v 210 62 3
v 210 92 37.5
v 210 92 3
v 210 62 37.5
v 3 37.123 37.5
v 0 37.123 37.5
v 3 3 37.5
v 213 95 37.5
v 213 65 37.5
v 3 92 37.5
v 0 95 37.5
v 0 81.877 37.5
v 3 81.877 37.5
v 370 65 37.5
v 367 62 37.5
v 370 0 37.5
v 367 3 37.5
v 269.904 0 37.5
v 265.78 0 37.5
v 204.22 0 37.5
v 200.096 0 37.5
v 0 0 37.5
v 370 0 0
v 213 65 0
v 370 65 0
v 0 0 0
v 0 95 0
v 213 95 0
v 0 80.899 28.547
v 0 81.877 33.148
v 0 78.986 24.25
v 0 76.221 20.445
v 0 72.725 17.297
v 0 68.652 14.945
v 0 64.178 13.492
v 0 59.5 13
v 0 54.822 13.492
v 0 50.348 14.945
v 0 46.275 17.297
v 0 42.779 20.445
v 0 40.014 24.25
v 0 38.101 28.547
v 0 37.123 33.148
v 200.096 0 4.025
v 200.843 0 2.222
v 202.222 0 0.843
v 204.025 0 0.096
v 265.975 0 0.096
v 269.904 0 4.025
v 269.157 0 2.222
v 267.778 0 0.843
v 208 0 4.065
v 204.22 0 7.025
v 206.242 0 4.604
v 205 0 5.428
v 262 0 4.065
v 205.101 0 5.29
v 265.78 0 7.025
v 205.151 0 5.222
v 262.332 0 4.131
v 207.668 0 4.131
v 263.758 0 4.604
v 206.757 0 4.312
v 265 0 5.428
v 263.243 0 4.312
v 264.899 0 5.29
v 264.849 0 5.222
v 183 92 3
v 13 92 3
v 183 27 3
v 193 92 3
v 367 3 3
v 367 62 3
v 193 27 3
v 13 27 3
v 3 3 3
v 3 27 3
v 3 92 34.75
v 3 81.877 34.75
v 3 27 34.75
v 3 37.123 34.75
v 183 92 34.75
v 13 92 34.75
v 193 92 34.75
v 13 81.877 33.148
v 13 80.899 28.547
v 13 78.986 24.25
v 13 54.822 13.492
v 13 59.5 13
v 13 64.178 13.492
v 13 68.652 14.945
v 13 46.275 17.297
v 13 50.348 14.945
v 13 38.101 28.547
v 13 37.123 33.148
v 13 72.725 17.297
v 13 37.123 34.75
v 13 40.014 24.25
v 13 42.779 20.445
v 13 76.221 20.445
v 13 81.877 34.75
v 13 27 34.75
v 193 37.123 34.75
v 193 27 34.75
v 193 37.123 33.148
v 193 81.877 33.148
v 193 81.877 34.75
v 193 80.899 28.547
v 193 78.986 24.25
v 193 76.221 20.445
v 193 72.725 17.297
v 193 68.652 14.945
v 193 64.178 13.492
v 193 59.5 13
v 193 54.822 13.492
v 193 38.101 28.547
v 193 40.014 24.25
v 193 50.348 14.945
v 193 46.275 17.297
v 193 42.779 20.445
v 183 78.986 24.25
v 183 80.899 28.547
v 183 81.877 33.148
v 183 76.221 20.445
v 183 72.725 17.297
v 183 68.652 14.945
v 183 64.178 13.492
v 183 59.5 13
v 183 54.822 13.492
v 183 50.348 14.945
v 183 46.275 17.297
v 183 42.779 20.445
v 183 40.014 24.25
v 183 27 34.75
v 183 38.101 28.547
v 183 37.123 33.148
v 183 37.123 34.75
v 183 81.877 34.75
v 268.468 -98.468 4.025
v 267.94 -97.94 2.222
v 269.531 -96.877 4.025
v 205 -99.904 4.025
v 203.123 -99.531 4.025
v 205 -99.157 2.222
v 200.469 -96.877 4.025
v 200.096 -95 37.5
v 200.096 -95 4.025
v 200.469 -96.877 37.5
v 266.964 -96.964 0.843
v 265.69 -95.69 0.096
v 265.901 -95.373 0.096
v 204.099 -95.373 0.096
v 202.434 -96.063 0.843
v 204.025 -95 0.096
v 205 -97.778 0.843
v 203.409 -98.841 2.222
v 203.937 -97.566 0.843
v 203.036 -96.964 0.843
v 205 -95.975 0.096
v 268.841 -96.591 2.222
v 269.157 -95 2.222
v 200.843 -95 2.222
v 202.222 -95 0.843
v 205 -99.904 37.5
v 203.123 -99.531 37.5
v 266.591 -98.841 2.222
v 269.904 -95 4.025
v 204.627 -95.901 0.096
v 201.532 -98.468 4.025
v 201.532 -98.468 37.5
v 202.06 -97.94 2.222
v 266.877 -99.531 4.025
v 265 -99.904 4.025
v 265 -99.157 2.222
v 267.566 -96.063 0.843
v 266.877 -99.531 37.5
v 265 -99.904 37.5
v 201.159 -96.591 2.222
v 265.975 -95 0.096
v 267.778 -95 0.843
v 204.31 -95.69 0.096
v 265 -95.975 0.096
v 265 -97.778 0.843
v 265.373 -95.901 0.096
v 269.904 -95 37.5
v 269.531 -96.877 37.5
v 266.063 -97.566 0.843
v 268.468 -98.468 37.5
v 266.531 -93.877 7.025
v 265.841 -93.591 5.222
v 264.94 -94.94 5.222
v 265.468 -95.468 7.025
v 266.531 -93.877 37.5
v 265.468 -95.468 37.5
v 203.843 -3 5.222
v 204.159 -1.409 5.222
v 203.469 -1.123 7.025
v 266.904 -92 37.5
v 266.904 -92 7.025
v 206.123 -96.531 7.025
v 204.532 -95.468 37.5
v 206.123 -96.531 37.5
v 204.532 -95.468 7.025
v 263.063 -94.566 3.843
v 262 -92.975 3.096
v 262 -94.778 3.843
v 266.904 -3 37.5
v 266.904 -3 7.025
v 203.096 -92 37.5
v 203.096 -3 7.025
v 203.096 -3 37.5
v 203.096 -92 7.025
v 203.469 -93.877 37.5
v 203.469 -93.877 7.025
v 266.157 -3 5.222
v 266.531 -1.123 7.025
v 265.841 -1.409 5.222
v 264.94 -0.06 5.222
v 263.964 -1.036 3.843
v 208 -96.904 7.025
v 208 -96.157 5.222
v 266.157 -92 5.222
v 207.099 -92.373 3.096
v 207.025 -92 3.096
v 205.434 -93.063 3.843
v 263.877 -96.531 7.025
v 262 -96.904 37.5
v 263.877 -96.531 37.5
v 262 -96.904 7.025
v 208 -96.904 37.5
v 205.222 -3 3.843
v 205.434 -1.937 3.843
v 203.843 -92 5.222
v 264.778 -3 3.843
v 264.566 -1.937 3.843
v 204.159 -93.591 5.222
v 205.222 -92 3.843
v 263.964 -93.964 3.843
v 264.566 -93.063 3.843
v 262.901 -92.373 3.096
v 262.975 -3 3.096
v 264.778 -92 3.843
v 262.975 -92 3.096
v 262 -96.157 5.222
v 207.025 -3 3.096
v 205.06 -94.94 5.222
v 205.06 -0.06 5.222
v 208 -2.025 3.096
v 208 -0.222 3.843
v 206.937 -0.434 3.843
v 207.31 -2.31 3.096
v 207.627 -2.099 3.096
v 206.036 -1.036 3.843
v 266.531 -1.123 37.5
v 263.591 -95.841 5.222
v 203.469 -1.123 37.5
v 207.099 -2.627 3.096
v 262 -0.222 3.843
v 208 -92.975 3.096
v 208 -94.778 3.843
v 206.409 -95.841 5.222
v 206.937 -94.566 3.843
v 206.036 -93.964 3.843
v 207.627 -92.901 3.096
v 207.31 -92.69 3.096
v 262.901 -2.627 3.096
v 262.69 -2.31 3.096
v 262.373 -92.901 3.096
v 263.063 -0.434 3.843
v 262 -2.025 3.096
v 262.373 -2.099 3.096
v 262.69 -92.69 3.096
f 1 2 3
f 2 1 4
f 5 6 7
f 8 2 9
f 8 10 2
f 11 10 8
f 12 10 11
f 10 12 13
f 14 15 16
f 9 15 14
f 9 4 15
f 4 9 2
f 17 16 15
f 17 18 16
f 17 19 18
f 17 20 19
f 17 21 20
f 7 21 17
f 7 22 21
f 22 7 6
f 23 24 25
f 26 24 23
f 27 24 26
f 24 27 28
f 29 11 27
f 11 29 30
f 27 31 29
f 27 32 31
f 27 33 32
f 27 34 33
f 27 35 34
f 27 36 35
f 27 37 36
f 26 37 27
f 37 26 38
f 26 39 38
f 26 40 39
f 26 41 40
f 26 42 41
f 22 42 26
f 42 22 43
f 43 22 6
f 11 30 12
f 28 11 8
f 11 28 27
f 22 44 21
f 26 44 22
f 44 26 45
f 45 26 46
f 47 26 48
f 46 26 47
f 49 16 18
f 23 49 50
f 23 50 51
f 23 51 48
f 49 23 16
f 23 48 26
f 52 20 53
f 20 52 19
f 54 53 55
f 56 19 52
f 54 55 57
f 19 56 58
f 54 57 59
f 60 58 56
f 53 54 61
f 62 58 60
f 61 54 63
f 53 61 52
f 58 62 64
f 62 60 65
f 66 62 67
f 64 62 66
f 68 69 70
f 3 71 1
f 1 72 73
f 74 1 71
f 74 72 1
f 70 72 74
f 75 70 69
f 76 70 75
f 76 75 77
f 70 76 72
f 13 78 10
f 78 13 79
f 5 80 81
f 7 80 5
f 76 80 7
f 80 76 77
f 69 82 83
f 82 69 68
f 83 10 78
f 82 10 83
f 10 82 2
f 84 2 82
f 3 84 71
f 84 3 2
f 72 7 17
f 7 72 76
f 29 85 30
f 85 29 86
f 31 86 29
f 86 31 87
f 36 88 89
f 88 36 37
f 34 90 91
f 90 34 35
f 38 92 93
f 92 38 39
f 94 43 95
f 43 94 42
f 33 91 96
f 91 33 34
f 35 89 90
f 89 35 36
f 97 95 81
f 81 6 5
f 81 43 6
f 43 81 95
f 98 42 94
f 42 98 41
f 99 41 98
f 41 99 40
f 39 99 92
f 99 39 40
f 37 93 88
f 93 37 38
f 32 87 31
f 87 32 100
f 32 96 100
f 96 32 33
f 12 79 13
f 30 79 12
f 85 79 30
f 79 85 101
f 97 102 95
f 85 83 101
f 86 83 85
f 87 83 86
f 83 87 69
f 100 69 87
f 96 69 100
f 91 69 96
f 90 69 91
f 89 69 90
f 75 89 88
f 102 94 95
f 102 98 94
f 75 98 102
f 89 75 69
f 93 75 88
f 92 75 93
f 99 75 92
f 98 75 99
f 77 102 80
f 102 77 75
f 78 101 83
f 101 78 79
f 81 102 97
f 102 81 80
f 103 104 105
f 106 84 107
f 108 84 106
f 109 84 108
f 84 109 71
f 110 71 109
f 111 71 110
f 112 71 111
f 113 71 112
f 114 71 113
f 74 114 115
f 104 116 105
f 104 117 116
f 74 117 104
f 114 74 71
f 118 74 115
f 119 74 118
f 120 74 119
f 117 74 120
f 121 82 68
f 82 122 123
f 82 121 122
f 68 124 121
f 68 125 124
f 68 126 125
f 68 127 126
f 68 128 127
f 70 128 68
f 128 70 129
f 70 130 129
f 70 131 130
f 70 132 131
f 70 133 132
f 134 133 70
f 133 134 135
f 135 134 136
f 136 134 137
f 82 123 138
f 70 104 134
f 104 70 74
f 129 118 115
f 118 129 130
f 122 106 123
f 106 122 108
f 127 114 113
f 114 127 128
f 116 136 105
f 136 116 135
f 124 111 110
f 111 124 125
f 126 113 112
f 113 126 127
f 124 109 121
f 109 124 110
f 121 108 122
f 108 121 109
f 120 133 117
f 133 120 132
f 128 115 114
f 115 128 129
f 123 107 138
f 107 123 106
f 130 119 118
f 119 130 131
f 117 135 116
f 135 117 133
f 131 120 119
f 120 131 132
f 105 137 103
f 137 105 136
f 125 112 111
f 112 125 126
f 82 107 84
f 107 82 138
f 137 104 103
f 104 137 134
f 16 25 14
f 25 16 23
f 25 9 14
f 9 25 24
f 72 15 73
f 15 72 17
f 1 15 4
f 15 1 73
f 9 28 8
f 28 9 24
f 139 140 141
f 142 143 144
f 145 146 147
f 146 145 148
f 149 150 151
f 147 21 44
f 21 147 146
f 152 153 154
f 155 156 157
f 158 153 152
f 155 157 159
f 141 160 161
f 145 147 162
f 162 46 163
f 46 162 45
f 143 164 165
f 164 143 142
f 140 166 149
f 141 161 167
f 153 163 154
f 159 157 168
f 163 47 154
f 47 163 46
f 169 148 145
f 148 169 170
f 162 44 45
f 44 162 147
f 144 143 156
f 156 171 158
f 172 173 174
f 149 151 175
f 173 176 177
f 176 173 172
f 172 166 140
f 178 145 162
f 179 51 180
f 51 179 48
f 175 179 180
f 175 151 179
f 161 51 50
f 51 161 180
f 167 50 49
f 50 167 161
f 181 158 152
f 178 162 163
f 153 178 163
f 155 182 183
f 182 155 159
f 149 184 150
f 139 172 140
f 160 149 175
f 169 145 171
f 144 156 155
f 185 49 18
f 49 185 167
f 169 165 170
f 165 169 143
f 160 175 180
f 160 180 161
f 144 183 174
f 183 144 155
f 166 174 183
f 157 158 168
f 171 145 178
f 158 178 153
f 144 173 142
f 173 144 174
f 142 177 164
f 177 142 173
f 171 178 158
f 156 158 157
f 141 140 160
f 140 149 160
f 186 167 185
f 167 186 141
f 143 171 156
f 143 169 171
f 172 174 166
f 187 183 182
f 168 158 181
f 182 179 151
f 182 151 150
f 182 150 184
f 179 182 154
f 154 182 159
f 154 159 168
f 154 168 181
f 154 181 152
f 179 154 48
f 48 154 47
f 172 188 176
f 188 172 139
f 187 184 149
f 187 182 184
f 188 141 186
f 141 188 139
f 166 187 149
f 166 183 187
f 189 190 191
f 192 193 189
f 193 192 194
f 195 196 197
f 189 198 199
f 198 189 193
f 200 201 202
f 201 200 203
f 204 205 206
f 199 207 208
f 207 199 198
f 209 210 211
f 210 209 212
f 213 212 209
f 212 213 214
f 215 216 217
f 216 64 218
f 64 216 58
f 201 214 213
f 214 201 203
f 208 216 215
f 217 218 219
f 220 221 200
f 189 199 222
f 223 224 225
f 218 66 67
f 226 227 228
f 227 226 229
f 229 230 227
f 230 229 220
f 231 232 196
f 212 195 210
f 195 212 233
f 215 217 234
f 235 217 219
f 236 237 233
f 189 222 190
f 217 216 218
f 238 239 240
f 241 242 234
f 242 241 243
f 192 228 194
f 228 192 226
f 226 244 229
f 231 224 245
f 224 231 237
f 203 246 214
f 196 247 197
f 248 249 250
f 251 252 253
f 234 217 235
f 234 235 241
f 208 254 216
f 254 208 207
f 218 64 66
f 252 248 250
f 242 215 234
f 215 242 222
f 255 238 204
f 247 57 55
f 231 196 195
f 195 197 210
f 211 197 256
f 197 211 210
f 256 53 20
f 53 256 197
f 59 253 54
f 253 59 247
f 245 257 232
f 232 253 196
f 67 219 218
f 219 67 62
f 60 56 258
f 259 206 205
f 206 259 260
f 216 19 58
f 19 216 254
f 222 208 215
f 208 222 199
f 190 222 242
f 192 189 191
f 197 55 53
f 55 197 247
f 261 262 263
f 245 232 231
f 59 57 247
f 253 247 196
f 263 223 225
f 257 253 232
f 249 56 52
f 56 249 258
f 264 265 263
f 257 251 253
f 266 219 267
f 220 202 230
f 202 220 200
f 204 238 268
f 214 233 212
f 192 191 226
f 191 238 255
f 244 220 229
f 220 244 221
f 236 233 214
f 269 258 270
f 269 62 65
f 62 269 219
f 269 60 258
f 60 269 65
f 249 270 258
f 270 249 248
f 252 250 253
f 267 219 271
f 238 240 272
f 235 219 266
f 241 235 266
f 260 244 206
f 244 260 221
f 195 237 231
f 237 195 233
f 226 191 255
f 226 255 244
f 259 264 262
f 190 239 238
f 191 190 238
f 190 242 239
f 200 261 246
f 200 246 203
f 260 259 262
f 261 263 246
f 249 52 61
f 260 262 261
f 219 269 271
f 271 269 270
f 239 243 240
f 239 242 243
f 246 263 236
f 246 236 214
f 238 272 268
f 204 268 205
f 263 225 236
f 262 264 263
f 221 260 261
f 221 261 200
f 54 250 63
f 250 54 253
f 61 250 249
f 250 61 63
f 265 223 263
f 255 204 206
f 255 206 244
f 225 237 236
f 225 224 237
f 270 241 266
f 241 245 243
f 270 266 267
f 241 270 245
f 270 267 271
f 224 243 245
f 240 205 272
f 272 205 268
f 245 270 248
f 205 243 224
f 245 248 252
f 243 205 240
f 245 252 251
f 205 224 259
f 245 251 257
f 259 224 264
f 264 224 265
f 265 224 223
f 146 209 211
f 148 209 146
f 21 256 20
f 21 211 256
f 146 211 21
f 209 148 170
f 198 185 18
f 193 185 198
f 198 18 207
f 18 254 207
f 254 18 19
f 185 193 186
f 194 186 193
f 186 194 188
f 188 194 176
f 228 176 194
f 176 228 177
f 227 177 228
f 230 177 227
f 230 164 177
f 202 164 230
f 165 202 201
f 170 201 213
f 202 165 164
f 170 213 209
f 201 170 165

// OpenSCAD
/**
* Tagger which can be printed.
* All dimensions are in millimeters
*/




// lens tube dims
lensTubeDiameter=45;
lensTubeLength=200;

// lens tube fixiations dims 
lensTubeFixWidth=10;
lensTubeFixFlesh=10;
lensTubeFixHeight=lensTubeDiameter + 2 * lensTubeFixFlesh;
lensTubeGap=1.5;

// pcb parameters
esp32Height=30;
displayWidth=10;
displayHeight=30;
displayThickness=10;




// gun parameters
gunWallThickness=3;
gunHeight=lensTubeFixHeight + esp32Height;
gunFrontLength = lensTubeLength + 10;
gunBackLength = 150 + displayThickness;
gunThickness = lensTubeDiameter + 30;
gunHalfThickness = gunThickness / 2;

// grip parameters
gripWidth=70;
gripHeight=100;
gripFrontOffset=200;
gripCornerRadius=5;


/**
* Fixiation for the lens tube
*/
module lensTubeFixiation() {
  difference() {
    cube(size=[lensTubeFixWidth, lensTubeFixHeight, lensTubeFixHeight], center=false);     
    translate([0, lensTubeFixHeight / 2, lensTubeFixHeight / 2]) {
      rotate([0, 90, 0]) {
        cylinder(d=lensTubeDiameter, h=lensTubeFixWidth, center=false);    
      }  
    }

    // cut of the top
    offset = lensTubeFixHeight / 2 - lensTubeGap / 2;
    translate([0, 0, offset]) {
      cube(size=[lensTubeFixWidth, lensTubeFixHeight, lensTubeFixHeight / 2 + lensTubeGap / 2], center=false);
    }
  }
}

module gunBodyFront() {
  difference() {    
    cube(size=[gunFrontLength, gunHeight, gunHalfThickness], center=false);
    translate([gunWallThickness, gunWallThickness, gunWallThickness]) {
      cube(size=[gunFrontLength -  gunWallThickness, gunHeight - gunWallThickness * 2,gunHalfThickness - gunWallThickness ], center=false);
    }
  }
}

module gunBodyBack() {
  gunBackHeight =  gunHeight - displayHeight;
  union() {
    difference() {
      cube(size=[gunBackLength, gunBackHeight, gunHalfThickness], center=false);
      translate([0, gunWallThickness, gunWallThickness]) {
        cube(size=[gunBackLength - gunWallThickness, gunBackHeight - gunWallThickness * 2, gunHalfThickness - gunWallThickness], center=false);      
      }
    }
    
    // display part  
    translate([0, gunBackHeight, 0]) {
        cube(size=[gunWallThickness, displayHeight, gunHalfThickness], center=false);     
    }
    
  
  }
}

module gripBody() {
  translate([gripCornerRadius, gripCornerRadius, gripCornerRadius]) {  
    difference() {
      minkowski() {
        cube(size=[gripWidth - 2 * gripCornerRadius , gripHeight - gripCornerRadius, gunHalfThickness -  gripCornerRadius], center=false);
        sphere(r=gripCornerRadius);
      }

      translate([gunWallThickness, gunWallThickness, gunWallThickness]) {
        minkowski() {
          cube(size=[gripWidth - 2 * gripCornerRadius - 2 * gunWallThickness , gripHeight - gripCornerRadius - 2 * gunWallThickness , gunHalfThickness -  gripCornerRadius], center=false);
          sphere(r=gripCornerRadius);
        }
      }


      // cut off the top
      translate([-gripCornerRadius, - gripCornerRadius, gunHalfThickness - gripCornerRadius]) {
        cube(size=[gripWidth, gripHeight + gripCornerRadius, gripCornerRadius], center=false);
      }

      // cut of the cap
      translate([-gripCornerRadius, gripHeight - gripCornerRadius, -gripCornerRadius]) {
        cube(size=[gripWidth,  gripCornerRadius, gunHalfThickness], center=false);
      }     
    }
  }
}

module gunBody() {
  union() {
    difference() {
      gunBodyFront();
      tubeHoleOffset = gunHeight - lensTubeDiameter / 2 - lensTubeFixFlesh -gunWallThickness;
      //echo(str("Variable = ", gunHeight - lensTubeDiameter / 2 - lensTubeFixFlesh -gunWallThickness));
      translate([0,tubeHoleOffset, lensTubeDiameter / 2 + lensTubeFixFlesh + gunWallThickness]) {
        rotate([0, 90, 0]) {
          #cylinder(d=lensTubeDiameter, h=gunWallThickness, center=false);
        }  
      }
      
    }

    translate([gunWallThickness, gunHeight - lensTubeFixHeight - gunWallThickness, gunWallThickness ]) {
      lensTubeFixiation();  
      translate([lensTubeLength - 2 * lensTubeFixWidth, 0, 0]) {
        lensTubeFixiation();   
      }
    }

    

    translate([gunFrontLength, 0, 0]) {
      gunBodyBack();   
    }
  }
}


gunBody();

translate([gripFrontOffset, -gripHeight , 0]) {
  gripBody();  
}









//lensTubeFixiation();
